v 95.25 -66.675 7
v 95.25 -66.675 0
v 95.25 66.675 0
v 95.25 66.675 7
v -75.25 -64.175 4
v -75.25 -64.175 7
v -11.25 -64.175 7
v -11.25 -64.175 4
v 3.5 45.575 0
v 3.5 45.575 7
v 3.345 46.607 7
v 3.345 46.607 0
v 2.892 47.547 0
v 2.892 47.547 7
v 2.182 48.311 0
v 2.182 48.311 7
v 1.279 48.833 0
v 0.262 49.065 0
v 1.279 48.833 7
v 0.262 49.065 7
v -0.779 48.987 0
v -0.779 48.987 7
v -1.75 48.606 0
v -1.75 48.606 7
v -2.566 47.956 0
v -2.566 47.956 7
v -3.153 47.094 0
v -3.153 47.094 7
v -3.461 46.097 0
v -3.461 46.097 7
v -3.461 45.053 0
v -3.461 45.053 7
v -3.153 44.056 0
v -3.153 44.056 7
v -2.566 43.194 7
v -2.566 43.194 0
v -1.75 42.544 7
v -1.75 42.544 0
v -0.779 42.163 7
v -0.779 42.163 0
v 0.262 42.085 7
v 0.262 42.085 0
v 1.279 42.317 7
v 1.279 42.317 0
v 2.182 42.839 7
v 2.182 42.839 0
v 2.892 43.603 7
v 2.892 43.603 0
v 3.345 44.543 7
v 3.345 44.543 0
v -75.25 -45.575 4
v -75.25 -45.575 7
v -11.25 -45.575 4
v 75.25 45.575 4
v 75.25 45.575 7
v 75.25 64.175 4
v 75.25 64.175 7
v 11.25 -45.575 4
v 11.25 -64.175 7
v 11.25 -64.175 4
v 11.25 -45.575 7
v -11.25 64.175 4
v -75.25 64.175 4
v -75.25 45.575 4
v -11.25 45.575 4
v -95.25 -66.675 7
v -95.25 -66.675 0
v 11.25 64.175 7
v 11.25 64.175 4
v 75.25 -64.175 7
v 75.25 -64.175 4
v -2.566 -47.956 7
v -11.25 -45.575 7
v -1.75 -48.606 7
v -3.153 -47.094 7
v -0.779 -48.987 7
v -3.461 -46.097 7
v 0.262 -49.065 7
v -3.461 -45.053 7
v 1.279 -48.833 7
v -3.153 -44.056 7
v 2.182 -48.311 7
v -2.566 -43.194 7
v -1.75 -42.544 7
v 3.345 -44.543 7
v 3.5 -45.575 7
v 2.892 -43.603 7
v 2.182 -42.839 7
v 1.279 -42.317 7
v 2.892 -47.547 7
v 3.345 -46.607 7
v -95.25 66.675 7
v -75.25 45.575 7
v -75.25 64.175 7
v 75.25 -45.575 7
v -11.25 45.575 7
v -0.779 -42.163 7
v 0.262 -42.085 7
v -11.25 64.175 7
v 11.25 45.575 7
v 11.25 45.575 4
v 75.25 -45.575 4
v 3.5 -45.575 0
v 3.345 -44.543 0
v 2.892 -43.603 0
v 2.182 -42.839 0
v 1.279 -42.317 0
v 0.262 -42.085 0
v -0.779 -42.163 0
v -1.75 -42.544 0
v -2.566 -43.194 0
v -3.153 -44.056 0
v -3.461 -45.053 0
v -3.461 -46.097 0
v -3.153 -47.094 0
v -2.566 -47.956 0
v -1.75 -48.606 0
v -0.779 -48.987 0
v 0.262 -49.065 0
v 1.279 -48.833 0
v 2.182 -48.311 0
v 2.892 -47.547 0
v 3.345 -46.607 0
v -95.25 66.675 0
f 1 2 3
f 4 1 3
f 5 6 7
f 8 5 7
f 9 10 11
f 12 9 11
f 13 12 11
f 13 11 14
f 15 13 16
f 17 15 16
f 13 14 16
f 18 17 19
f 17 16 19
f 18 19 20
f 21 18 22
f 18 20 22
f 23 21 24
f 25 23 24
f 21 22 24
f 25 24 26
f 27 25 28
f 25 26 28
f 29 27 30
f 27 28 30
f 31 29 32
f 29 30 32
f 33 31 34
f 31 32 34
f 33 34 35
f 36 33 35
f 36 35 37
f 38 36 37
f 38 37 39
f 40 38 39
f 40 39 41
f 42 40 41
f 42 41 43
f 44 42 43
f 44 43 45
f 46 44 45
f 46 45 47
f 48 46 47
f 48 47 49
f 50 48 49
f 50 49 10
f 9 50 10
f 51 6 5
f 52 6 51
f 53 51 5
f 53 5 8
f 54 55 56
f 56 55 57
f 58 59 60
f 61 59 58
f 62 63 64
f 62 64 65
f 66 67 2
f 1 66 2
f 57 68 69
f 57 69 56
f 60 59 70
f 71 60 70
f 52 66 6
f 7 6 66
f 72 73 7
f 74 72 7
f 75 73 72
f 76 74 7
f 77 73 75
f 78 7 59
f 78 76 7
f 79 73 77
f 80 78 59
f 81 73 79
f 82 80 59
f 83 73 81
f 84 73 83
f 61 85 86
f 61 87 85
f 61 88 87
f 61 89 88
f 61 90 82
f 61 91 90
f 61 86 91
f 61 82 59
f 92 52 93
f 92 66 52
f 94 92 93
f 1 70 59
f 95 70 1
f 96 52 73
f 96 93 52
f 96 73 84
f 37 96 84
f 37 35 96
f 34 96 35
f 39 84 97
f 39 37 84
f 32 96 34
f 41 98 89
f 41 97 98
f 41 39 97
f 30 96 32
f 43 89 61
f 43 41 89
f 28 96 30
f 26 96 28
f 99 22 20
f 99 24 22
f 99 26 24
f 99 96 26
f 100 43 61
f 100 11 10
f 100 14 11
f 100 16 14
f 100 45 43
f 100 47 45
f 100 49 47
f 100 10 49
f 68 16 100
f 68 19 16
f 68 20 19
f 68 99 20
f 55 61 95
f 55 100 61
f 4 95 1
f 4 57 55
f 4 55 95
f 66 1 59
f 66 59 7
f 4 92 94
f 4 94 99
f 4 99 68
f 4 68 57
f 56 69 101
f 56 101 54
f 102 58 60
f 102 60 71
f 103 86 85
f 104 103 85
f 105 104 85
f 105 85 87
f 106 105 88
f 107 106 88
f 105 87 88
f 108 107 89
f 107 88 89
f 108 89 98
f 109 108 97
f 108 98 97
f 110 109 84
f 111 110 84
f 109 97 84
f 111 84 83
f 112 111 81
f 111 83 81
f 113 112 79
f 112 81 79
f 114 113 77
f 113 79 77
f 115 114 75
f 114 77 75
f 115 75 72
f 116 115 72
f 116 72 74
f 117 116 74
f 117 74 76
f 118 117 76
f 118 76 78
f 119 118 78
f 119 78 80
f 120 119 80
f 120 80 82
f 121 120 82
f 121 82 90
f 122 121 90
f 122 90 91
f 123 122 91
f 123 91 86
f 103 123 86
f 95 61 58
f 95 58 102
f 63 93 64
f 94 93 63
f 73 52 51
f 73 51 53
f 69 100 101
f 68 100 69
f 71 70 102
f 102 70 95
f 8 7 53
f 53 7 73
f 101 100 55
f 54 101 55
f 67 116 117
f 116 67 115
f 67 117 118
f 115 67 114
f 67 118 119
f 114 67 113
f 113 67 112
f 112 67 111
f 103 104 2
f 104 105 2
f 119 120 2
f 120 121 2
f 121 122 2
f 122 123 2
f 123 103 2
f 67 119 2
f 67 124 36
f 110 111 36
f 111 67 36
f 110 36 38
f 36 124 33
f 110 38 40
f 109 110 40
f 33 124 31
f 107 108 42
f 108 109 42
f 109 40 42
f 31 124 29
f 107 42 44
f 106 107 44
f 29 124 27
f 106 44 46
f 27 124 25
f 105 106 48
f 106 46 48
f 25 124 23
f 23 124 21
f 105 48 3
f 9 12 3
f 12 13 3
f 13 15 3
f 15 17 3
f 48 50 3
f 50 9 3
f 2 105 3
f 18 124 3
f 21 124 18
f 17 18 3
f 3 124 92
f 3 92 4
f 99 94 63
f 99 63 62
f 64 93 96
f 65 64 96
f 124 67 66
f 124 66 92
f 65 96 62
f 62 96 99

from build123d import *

# Parameters (mm, degrees)
F0_W     = 190.5
F0_H     = 133.35
F1_DEPTH = 7
F2_W     = 64
F2_H     = 18.6
F3_DEPTH = 3
F4_R     = 3.5
F5_DEPTH = 25


with BuildPart() as f1:
    # F0 (on Top) → F1 (new body)
    with BuildSketch(Plane.XY):
        Rectangle(F0_W, F0_H)
    extrude(amount=F1_DEPTH)

    # F2 (on face) → F3 (cut)
    with BuildSketch(Plane.XY.offset(7)):
        with Locations((-43.25, 54.875)):
            Rectangle(F2_W, F2_H)
        with Locations((43.25, 54.875)):
            Rectangle(F2_W, F2_H)
        with Locations((43.25, -54.875)):
            Rectangle(F2_W, F2_H)
        with Locations((-43.25, -54.875)):
            Rectangle(F2_W, F2_H)
    extrude(amount=-F3_DEPTH, mode=Mode.SUBTRACT)

    # F4 (on face) → F5 (cut)
    with BuildSketch(Plane.XY.offset(7)):
        with Locations((0, -45.575)):
            Circle(F4_R)
        with Locations((0, 45.575)):
            Circle(F4_R)
    extrude(amount=-F5_DEPTH, mode=Mode.SUBTRACT)


solid = f1.part
